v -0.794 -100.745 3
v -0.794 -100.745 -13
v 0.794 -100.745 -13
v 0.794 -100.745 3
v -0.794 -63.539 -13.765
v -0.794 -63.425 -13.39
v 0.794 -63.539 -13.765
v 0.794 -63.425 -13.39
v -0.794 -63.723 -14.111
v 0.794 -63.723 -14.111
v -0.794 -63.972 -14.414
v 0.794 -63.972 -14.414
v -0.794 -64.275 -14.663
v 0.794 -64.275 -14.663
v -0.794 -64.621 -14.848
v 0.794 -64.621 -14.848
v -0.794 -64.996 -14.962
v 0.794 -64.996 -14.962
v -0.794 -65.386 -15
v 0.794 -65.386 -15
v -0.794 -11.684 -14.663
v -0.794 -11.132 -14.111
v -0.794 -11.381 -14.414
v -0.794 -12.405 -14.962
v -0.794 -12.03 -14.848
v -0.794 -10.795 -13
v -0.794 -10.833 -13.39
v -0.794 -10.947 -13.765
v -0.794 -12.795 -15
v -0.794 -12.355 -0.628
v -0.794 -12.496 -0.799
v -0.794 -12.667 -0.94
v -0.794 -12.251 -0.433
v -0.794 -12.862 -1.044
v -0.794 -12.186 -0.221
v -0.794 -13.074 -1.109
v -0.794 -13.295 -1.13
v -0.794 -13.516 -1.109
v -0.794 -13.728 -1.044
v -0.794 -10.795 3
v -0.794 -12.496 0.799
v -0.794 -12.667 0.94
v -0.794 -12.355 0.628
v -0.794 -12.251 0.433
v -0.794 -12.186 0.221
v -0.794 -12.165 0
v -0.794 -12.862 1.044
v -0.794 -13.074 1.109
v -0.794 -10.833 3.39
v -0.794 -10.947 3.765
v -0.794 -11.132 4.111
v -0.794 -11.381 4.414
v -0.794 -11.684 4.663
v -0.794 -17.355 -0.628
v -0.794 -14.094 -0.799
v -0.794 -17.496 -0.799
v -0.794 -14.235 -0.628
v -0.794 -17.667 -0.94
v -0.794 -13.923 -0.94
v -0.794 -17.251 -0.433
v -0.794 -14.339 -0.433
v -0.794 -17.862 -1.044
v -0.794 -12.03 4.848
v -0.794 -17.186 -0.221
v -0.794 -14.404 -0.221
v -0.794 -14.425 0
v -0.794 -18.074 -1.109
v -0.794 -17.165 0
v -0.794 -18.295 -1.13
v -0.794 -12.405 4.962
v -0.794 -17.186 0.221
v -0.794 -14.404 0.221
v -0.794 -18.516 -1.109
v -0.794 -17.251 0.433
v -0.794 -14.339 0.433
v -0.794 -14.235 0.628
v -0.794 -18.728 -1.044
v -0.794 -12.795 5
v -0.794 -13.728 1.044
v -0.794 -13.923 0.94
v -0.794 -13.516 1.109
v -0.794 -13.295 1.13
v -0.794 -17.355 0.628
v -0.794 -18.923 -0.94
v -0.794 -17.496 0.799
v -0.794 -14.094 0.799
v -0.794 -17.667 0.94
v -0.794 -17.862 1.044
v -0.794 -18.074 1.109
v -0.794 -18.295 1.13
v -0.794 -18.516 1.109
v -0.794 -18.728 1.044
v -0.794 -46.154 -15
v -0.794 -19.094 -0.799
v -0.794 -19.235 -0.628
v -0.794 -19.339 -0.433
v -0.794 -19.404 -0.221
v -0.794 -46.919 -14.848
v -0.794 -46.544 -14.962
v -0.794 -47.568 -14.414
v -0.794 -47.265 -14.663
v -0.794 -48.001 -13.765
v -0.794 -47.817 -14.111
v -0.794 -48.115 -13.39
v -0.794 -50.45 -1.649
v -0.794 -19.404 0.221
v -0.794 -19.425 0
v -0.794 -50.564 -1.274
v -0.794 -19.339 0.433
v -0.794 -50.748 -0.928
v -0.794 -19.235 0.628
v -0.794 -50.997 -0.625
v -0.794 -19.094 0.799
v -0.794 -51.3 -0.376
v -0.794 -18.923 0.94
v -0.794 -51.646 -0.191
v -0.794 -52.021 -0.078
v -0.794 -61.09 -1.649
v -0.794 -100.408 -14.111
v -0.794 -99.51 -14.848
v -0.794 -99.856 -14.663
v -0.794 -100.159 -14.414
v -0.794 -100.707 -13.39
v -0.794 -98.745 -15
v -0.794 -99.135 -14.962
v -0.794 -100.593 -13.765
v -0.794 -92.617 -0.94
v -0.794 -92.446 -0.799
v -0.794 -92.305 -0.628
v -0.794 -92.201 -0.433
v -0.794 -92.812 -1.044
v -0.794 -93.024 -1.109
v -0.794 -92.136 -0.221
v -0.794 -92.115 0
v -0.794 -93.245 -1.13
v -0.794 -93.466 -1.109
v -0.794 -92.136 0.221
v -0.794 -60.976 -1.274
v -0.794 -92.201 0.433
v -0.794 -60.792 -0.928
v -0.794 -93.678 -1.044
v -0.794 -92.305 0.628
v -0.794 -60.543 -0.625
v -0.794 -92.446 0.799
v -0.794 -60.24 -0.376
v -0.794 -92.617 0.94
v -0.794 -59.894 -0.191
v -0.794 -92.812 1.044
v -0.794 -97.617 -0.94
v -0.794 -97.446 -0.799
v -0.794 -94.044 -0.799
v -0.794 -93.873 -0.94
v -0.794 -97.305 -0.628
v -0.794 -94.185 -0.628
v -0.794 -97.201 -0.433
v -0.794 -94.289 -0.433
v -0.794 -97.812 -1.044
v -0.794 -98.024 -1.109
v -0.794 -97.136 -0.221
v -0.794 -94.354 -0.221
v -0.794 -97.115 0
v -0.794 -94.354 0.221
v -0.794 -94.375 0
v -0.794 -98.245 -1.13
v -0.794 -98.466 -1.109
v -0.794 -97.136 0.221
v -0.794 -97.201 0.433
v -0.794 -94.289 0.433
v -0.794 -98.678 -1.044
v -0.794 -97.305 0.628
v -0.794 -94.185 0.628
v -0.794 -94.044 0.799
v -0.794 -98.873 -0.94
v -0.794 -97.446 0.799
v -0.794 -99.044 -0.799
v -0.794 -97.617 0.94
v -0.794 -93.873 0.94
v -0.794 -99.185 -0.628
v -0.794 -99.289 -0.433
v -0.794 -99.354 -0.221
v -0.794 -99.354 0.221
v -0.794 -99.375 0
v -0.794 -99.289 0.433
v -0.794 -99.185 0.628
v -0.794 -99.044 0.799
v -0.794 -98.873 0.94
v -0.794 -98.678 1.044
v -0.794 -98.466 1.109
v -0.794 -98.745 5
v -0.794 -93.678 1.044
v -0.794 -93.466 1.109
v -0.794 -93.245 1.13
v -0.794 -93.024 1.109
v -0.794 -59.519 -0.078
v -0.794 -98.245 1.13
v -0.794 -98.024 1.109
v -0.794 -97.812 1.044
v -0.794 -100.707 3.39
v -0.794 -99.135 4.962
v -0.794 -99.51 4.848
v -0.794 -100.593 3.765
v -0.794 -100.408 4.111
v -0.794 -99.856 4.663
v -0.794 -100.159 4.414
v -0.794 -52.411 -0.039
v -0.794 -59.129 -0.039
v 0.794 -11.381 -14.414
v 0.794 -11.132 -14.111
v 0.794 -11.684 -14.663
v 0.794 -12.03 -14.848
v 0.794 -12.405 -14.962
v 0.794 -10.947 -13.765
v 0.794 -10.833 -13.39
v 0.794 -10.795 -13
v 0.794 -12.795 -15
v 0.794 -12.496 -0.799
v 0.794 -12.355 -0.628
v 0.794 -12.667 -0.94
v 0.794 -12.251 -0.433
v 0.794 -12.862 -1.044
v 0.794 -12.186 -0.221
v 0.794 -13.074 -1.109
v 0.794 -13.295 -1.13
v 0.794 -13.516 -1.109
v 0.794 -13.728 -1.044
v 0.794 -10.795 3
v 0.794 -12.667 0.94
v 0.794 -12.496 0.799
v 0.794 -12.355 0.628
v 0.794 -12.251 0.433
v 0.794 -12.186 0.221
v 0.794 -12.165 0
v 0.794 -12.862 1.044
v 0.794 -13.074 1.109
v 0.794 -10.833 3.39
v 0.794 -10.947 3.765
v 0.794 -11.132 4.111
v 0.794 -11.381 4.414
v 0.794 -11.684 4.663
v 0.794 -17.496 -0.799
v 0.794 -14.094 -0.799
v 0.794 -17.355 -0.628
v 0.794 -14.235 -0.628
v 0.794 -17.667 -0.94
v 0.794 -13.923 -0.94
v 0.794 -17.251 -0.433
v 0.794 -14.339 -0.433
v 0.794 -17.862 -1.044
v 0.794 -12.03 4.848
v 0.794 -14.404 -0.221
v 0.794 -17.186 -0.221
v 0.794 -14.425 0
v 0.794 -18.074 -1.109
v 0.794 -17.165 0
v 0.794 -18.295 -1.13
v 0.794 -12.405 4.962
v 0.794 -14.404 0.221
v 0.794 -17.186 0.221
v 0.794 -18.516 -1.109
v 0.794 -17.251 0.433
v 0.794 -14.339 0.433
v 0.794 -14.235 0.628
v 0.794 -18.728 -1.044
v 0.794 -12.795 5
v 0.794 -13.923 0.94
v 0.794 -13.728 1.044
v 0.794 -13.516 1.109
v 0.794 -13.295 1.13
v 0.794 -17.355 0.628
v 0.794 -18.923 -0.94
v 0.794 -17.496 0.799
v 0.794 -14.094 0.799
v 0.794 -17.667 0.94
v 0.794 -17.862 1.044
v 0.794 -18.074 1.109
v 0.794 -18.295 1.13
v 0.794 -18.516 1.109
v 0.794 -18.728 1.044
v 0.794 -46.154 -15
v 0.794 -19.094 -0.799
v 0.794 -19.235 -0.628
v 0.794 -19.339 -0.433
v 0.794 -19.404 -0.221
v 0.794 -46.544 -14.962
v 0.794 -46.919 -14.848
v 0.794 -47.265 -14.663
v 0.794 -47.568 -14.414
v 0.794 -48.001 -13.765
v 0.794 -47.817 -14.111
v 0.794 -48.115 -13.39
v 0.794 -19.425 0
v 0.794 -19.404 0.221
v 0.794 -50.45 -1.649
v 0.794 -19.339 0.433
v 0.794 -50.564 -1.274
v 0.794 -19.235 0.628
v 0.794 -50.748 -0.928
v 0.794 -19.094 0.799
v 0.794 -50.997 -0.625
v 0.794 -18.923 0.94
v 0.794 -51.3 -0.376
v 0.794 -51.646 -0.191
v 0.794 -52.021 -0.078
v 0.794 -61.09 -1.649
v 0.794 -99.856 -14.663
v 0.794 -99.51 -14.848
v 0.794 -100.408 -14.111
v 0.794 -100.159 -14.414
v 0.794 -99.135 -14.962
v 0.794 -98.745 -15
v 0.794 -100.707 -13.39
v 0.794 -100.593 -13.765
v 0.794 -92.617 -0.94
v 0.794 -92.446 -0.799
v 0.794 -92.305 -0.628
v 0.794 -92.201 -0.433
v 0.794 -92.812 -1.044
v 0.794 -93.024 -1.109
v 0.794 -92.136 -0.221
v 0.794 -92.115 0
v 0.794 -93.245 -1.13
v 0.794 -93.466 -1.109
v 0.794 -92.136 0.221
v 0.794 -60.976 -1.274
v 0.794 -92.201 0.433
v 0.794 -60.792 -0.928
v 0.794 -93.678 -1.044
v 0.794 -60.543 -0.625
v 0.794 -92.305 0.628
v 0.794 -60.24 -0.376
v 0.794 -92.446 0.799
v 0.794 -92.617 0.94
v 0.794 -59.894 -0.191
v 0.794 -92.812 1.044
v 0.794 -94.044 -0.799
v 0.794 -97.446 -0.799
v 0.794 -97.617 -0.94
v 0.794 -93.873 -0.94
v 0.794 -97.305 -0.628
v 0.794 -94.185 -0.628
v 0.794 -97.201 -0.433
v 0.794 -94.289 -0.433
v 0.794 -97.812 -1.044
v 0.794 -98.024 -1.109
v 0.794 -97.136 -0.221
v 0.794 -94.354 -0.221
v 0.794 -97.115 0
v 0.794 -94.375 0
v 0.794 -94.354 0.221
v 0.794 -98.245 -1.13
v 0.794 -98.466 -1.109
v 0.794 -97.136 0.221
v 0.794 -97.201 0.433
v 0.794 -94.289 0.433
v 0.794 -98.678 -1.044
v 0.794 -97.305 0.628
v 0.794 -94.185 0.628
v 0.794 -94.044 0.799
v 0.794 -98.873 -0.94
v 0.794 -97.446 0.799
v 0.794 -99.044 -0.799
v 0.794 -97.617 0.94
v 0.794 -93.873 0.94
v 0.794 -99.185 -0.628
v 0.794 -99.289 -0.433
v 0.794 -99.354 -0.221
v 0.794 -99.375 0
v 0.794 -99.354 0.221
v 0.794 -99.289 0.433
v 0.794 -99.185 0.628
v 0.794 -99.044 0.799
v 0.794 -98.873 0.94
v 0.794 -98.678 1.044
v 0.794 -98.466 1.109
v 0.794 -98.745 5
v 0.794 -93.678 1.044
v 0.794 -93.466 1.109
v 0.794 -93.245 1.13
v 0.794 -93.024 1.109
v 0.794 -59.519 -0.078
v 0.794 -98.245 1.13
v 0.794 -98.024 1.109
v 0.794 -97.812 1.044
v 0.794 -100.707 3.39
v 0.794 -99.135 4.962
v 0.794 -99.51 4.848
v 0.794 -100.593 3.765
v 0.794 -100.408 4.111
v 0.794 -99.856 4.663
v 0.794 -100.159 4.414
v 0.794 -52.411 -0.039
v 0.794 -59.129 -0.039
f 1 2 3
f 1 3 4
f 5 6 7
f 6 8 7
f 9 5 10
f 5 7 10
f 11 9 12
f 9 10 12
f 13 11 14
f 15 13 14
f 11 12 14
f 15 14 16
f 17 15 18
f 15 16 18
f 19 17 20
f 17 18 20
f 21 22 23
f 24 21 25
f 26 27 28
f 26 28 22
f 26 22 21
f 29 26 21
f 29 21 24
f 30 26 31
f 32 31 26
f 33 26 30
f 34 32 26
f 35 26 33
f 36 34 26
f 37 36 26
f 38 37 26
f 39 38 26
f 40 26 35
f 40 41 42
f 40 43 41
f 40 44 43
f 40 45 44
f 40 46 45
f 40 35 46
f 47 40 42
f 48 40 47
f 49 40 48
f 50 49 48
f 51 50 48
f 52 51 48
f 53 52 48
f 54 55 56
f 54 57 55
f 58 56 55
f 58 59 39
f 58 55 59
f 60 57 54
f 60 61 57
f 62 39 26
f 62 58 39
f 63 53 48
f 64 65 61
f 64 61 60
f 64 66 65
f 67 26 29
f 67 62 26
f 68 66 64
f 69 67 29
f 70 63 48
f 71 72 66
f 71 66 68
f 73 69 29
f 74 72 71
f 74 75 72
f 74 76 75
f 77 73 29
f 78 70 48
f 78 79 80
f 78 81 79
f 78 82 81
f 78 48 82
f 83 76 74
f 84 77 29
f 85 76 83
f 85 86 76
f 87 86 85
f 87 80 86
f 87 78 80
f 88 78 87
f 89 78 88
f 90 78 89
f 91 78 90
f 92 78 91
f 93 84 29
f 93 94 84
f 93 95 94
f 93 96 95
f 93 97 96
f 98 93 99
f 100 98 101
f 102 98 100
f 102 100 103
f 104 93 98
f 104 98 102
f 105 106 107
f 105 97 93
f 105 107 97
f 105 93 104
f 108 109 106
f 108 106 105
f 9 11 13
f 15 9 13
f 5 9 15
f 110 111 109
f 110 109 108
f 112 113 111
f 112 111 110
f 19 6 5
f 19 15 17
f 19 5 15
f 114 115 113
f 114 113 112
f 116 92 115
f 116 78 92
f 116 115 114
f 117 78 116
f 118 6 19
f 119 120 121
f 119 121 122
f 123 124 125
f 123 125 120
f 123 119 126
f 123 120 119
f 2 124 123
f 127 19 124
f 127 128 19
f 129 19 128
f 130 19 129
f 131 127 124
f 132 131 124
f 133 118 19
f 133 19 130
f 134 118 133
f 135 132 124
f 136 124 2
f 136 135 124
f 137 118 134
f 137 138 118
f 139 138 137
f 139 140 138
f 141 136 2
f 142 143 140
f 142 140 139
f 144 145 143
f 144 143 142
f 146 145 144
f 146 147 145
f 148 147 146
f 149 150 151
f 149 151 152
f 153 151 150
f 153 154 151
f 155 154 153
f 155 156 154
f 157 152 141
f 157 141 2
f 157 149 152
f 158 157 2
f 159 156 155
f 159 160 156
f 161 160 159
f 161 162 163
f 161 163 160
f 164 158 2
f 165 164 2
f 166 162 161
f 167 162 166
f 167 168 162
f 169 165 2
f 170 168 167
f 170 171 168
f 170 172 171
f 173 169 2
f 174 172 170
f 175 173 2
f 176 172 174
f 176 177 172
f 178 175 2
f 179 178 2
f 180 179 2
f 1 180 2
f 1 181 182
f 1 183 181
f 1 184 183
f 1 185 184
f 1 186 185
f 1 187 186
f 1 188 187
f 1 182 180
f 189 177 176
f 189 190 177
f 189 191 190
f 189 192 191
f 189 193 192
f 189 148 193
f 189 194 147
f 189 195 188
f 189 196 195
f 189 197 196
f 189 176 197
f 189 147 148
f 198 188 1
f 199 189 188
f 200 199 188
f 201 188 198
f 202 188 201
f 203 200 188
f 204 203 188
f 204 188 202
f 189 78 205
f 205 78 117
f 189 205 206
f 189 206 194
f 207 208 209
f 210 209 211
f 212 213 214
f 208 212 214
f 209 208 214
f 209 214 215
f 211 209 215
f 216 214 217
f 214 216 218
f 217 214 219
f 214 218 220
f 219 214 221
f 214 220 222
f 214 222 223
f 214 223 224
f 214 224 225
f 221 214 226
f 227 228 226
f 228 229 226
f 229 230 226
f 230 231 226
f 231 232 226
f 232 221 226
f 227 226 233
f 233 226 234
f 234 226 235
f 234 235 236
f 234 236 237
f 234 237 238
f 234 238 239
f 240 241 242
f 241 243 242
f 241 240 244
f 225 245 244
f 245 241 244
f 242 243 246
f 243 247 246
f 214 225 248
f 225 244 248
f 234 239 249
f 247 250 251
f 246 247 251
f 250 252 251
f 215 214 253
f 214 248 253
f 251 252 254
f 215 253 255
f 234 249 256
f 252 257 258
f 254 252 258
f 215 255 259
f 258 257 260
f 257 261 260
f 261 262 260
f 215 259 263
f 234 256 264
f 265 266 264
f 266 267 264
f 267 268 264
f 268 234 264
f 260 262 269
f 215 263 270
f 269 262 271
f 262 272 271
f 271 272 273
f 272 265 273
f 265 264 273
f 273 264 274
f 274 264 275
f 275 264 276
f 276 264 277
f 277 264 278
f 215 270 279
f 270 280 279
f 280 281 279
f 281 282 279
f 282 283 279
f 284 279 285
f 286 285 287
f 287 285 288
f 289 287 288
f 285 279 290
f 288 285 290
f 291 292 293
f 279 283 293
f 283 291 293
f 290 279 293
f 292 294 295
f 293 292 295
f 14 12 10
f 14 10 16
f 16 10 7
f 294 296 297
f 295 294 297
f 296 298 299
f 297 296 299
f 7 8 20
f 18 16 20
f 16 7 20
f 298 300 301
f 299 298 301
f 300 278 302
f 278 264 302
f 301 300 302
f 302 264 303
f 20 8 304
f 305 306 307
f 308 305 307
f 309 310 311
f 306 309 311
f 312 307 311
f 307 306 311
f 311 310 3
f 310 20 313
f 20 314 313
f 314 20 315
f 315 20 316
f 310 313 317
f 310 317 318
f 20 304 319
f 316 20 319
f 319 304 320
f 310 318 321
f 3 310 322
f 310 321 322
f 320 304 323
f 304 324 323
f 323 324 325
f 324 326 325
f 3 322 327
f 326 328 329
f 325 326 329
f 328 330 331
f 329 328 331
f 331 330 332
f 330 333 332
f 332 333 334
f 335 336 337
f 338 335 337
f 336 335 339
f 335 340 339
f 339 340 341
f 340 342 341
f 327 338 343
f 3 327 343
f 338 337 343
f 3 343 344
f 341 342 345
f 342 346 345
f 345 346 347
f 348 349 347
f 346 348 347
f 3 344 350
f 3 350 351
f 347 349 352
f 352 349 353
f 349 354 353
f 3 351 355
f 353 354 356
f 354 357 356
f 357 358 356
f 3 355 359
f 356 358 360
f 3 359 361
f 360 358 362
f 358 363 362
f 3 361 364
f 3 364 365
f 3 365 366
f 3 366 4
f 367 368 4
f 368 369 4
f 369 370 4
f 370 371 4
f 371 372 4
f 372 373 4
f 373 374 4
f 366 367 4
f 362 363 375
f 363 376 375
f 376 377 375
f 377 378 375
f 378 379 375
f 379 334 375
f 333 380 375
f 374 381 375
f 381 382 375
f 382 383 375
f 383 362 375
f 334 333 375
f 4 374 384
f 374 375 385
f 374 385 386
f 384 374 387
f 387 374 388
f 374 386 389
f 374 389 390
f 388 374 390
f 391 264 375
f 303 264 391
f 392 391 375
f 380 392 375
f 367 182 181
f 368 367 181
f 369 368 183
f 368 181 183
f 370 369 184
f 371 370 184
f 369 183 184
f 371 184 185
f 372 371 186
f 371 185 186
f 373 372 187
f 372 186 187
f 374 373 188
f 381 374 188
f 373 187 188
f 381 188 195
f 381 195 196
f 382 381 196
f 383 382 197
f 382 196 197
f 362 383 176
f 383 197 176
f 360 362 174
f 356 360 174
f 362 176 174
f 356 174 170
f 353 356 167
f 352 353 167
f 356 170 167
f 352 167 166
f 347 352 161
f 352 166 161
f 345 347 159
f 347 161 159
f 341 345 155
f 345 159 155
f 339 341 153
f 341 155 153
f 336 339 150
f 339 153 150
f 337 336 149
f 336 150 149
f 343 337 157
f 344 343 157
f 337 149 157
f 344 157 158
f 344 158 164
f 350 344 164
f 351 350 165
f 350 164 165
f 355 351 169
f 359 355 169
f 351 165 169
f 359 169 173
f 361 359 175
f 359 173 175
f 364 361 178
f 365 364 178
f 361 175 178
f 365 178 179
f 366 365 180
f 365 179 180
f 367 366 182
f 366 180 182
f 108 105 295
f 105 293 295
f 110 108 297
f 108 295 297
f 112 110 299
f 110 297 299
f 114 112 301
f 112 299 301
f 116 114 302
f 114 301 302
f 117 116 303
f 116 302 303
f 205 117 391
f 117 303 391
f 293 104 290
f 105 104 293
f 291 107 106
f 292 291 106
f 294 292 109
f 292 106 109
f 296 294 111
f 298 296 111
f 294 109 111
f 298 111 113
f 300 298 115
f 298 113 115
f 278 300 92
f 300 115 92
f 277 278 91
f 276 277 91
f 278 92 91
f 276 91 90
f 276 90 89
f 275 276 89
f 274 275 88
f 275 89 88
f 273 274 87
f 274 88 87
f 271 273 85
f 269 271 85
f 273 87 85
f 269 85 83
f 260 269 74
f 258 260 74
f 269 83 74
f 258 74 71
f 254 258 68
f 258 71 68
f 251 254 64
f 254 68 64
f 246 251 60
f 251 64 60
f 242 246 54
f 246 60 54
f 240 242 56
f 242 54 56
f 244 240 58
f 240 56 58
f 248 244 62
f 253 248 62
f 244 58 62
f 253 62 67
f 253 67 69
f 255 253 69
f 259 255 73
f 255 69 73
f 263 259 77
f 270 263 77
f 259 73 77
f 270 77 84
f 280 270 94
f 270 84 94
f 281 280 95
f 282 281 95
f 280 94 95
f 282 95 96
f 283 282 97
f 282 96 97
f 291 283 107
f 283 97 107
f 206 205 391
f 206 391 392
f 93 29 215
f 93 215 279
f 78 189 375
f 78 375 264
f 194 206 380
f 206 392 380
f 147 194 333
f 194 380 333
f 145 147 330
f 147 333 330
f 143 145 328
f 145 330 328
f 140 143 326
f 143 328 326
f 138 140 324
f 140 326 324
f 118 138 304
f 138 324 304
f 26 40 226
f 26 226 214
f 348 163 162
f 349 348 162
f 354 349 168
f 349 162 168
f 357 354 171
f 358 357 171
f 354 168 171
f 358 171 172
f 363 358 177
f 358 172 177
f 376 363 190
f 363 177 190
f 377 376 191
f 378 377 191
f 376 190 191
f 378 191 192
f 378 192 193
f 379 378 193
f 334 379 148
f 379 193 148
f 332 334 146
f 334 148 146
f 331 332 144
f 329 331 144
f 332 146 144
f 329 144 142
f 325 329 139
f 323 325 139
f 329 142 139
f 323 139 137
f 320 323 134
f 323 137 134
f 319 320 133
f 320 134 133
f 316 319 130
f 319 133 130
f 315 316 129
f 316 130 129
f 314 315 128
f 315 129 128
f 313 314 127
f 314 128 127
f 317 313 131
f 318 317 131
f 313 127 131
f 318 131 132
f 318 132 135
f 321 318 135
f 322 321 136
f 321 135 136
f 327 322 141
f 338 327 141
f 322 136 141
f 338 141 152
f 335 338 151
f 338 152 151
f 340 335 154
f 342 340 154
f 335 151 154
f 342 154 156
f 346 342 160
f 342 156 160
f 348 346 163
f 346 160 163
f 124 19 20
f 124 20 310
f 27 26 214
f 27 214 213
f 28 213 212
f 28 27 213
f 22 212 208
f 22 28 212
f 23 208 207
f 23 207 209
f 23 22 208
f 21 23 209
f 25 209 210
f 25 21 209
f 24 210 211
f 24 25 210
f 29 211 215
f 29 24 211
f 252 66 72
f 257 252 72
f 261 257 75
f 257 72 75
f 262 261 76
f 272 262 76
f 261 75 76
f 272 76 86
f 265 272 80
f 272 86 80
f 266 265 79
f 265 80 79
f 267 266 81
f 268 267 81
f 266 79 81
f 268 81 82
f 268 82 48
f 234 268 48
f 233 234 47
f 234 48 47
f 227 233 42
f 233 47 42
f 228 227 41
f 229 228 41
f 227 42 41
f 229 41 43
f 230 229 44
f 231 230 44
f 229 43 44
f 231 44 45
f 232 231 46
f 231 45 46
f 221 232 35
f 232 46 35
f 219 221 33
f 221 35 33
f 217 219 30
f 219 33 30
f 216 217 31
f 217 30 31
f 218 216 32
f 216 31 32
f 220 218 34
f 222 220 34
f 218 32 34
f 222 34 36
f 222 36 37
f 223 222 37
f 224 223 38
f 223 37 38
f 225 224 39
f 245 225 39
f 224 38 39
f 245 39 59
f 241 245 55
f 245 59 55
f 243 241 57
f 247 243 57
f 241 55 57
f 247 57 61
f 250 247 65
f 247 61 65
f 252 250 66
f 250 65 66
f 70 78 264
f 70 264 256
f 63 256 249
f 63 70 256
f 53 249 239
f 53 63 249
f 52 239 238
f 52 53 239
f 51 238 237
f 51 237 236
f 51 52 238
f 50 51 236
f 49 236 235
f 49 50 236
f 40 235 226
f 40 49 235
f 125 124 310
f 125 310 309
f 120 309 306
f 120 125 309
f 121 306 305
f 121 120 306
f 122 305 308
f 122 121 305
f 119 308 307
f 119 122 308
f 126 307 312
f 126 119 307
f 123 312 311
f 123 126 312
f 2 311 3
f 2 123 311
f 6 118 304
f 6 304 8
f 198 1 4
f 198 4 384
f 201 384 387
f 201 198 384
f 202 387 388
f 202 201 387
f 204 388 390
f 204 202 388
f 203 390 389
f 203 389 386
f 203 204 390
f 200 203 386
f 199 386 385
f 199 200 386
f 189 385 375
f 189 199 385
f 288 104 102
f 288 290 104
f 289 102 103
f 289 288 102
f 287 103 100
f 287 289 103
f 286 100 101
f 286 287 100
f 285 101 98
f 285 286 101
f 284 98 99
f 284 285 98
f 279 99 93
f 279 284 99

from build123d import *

# Parameters (mm, degrees)
SKETCH_1_R      = 1.1303
EXTRUDE_1_DEPTH = 1.588
FILLET_1_R      = 2
FILLET_2_R      = 2
FILLET_3_R      = 2
FILLET_4_R      = 2


with BuildPart() as part:
    # 草图1 → 凸台-拉伸1 (new body)
    with BuildSketch(Plane(origin=(-0.79375, 0, 0), x_dir=(0, -1, 0), z_dir=(-1, 0, 0))):
        with BuildLine():
            Line((38.795, 5), (12.795, 5))
            ThreePointArc((12.795, 5), (11.380786438, 4.414213562), (10.795, 3))
            Line((10.795, 3), (10.795, -13))
            ThreePointArc((10.795, -13), (11.380786438, -14.414213562), (12.795, -15))
            Line((12.795, -15), (47.795, -15))
            Line((47.795, -15), (50.77, -0.039144756))
            Line((50.77, -0.039144756), (55.77, -0.039144756))
            Line((55.77, -0.039144756), (60.77, -0.039144756))
            Line((60.77, -0.039144756), (63.745, -15))
            Line((63.745, -15), (98.745, -15))
            ThreePointArc((98.745, -15), (100.159213562, -14.414213562), (100.745, -13))
            Line((100.745, -13), (100.745, 3))
            ThreePointArc((100.745, 3), (100.159213562, 4.414213562), (98.745, 5))
            Line((98.745, 5), (72.745, 5))
            Line((72.745, 5), (38.795, 5))
        make_face()
        with Locations((18.295, 0)):
            Circle(SKETCH_1_R, mode=Mode.SUBTRACT)
        with Locations((13.295, 0)):
            Circle(SKETCH_1_R, mode=Mode.SUBTRACT)
        with Locations((98.245, 0)):
            Circle(SKETCH_1_R, mode=Mode.SUBTRACT)
        with Locations((93.245, 0)):
            Circle(SKETCH_1_R, mode=Mode.SUBTRACT)
    extrude(amount=-EXTRUDE_1_DEPTH)

    # 圆角1
    fillet_1_edges = [part.edges().sort_by_distance(p)[0] for p in [
        (0.00025, -50.77, -0.039144756),
    ]]
    fillet(fillet_1_edges, radius=FILLET_1_R)

    # 圆角2
    fillet_2_edges = [part.edges().sort_by_distance(p)[0] for p in [
        (0.00025, -47.795, -15),
    ]]
    fillet(fillet_2_edges, radius=FILLET_2_R)

    # 圆角3
    fillet_3_edges = [part.edges().sort_by_distance(p)[0] for p in [
        (0.00025, -60.77, -0.039144756),
    ]]
    fillet(fillet_3_edges, radius=FILLET_3_R)

    # 圆角4
    fillet_4_edges = [part.edges().sort_by_distance(p)[0] for p in [
        (0.00025, -63.745, -15),
    ]]
    fillet(fillet_4_edges, radius=FILLET_4_R)


solid = part.part
